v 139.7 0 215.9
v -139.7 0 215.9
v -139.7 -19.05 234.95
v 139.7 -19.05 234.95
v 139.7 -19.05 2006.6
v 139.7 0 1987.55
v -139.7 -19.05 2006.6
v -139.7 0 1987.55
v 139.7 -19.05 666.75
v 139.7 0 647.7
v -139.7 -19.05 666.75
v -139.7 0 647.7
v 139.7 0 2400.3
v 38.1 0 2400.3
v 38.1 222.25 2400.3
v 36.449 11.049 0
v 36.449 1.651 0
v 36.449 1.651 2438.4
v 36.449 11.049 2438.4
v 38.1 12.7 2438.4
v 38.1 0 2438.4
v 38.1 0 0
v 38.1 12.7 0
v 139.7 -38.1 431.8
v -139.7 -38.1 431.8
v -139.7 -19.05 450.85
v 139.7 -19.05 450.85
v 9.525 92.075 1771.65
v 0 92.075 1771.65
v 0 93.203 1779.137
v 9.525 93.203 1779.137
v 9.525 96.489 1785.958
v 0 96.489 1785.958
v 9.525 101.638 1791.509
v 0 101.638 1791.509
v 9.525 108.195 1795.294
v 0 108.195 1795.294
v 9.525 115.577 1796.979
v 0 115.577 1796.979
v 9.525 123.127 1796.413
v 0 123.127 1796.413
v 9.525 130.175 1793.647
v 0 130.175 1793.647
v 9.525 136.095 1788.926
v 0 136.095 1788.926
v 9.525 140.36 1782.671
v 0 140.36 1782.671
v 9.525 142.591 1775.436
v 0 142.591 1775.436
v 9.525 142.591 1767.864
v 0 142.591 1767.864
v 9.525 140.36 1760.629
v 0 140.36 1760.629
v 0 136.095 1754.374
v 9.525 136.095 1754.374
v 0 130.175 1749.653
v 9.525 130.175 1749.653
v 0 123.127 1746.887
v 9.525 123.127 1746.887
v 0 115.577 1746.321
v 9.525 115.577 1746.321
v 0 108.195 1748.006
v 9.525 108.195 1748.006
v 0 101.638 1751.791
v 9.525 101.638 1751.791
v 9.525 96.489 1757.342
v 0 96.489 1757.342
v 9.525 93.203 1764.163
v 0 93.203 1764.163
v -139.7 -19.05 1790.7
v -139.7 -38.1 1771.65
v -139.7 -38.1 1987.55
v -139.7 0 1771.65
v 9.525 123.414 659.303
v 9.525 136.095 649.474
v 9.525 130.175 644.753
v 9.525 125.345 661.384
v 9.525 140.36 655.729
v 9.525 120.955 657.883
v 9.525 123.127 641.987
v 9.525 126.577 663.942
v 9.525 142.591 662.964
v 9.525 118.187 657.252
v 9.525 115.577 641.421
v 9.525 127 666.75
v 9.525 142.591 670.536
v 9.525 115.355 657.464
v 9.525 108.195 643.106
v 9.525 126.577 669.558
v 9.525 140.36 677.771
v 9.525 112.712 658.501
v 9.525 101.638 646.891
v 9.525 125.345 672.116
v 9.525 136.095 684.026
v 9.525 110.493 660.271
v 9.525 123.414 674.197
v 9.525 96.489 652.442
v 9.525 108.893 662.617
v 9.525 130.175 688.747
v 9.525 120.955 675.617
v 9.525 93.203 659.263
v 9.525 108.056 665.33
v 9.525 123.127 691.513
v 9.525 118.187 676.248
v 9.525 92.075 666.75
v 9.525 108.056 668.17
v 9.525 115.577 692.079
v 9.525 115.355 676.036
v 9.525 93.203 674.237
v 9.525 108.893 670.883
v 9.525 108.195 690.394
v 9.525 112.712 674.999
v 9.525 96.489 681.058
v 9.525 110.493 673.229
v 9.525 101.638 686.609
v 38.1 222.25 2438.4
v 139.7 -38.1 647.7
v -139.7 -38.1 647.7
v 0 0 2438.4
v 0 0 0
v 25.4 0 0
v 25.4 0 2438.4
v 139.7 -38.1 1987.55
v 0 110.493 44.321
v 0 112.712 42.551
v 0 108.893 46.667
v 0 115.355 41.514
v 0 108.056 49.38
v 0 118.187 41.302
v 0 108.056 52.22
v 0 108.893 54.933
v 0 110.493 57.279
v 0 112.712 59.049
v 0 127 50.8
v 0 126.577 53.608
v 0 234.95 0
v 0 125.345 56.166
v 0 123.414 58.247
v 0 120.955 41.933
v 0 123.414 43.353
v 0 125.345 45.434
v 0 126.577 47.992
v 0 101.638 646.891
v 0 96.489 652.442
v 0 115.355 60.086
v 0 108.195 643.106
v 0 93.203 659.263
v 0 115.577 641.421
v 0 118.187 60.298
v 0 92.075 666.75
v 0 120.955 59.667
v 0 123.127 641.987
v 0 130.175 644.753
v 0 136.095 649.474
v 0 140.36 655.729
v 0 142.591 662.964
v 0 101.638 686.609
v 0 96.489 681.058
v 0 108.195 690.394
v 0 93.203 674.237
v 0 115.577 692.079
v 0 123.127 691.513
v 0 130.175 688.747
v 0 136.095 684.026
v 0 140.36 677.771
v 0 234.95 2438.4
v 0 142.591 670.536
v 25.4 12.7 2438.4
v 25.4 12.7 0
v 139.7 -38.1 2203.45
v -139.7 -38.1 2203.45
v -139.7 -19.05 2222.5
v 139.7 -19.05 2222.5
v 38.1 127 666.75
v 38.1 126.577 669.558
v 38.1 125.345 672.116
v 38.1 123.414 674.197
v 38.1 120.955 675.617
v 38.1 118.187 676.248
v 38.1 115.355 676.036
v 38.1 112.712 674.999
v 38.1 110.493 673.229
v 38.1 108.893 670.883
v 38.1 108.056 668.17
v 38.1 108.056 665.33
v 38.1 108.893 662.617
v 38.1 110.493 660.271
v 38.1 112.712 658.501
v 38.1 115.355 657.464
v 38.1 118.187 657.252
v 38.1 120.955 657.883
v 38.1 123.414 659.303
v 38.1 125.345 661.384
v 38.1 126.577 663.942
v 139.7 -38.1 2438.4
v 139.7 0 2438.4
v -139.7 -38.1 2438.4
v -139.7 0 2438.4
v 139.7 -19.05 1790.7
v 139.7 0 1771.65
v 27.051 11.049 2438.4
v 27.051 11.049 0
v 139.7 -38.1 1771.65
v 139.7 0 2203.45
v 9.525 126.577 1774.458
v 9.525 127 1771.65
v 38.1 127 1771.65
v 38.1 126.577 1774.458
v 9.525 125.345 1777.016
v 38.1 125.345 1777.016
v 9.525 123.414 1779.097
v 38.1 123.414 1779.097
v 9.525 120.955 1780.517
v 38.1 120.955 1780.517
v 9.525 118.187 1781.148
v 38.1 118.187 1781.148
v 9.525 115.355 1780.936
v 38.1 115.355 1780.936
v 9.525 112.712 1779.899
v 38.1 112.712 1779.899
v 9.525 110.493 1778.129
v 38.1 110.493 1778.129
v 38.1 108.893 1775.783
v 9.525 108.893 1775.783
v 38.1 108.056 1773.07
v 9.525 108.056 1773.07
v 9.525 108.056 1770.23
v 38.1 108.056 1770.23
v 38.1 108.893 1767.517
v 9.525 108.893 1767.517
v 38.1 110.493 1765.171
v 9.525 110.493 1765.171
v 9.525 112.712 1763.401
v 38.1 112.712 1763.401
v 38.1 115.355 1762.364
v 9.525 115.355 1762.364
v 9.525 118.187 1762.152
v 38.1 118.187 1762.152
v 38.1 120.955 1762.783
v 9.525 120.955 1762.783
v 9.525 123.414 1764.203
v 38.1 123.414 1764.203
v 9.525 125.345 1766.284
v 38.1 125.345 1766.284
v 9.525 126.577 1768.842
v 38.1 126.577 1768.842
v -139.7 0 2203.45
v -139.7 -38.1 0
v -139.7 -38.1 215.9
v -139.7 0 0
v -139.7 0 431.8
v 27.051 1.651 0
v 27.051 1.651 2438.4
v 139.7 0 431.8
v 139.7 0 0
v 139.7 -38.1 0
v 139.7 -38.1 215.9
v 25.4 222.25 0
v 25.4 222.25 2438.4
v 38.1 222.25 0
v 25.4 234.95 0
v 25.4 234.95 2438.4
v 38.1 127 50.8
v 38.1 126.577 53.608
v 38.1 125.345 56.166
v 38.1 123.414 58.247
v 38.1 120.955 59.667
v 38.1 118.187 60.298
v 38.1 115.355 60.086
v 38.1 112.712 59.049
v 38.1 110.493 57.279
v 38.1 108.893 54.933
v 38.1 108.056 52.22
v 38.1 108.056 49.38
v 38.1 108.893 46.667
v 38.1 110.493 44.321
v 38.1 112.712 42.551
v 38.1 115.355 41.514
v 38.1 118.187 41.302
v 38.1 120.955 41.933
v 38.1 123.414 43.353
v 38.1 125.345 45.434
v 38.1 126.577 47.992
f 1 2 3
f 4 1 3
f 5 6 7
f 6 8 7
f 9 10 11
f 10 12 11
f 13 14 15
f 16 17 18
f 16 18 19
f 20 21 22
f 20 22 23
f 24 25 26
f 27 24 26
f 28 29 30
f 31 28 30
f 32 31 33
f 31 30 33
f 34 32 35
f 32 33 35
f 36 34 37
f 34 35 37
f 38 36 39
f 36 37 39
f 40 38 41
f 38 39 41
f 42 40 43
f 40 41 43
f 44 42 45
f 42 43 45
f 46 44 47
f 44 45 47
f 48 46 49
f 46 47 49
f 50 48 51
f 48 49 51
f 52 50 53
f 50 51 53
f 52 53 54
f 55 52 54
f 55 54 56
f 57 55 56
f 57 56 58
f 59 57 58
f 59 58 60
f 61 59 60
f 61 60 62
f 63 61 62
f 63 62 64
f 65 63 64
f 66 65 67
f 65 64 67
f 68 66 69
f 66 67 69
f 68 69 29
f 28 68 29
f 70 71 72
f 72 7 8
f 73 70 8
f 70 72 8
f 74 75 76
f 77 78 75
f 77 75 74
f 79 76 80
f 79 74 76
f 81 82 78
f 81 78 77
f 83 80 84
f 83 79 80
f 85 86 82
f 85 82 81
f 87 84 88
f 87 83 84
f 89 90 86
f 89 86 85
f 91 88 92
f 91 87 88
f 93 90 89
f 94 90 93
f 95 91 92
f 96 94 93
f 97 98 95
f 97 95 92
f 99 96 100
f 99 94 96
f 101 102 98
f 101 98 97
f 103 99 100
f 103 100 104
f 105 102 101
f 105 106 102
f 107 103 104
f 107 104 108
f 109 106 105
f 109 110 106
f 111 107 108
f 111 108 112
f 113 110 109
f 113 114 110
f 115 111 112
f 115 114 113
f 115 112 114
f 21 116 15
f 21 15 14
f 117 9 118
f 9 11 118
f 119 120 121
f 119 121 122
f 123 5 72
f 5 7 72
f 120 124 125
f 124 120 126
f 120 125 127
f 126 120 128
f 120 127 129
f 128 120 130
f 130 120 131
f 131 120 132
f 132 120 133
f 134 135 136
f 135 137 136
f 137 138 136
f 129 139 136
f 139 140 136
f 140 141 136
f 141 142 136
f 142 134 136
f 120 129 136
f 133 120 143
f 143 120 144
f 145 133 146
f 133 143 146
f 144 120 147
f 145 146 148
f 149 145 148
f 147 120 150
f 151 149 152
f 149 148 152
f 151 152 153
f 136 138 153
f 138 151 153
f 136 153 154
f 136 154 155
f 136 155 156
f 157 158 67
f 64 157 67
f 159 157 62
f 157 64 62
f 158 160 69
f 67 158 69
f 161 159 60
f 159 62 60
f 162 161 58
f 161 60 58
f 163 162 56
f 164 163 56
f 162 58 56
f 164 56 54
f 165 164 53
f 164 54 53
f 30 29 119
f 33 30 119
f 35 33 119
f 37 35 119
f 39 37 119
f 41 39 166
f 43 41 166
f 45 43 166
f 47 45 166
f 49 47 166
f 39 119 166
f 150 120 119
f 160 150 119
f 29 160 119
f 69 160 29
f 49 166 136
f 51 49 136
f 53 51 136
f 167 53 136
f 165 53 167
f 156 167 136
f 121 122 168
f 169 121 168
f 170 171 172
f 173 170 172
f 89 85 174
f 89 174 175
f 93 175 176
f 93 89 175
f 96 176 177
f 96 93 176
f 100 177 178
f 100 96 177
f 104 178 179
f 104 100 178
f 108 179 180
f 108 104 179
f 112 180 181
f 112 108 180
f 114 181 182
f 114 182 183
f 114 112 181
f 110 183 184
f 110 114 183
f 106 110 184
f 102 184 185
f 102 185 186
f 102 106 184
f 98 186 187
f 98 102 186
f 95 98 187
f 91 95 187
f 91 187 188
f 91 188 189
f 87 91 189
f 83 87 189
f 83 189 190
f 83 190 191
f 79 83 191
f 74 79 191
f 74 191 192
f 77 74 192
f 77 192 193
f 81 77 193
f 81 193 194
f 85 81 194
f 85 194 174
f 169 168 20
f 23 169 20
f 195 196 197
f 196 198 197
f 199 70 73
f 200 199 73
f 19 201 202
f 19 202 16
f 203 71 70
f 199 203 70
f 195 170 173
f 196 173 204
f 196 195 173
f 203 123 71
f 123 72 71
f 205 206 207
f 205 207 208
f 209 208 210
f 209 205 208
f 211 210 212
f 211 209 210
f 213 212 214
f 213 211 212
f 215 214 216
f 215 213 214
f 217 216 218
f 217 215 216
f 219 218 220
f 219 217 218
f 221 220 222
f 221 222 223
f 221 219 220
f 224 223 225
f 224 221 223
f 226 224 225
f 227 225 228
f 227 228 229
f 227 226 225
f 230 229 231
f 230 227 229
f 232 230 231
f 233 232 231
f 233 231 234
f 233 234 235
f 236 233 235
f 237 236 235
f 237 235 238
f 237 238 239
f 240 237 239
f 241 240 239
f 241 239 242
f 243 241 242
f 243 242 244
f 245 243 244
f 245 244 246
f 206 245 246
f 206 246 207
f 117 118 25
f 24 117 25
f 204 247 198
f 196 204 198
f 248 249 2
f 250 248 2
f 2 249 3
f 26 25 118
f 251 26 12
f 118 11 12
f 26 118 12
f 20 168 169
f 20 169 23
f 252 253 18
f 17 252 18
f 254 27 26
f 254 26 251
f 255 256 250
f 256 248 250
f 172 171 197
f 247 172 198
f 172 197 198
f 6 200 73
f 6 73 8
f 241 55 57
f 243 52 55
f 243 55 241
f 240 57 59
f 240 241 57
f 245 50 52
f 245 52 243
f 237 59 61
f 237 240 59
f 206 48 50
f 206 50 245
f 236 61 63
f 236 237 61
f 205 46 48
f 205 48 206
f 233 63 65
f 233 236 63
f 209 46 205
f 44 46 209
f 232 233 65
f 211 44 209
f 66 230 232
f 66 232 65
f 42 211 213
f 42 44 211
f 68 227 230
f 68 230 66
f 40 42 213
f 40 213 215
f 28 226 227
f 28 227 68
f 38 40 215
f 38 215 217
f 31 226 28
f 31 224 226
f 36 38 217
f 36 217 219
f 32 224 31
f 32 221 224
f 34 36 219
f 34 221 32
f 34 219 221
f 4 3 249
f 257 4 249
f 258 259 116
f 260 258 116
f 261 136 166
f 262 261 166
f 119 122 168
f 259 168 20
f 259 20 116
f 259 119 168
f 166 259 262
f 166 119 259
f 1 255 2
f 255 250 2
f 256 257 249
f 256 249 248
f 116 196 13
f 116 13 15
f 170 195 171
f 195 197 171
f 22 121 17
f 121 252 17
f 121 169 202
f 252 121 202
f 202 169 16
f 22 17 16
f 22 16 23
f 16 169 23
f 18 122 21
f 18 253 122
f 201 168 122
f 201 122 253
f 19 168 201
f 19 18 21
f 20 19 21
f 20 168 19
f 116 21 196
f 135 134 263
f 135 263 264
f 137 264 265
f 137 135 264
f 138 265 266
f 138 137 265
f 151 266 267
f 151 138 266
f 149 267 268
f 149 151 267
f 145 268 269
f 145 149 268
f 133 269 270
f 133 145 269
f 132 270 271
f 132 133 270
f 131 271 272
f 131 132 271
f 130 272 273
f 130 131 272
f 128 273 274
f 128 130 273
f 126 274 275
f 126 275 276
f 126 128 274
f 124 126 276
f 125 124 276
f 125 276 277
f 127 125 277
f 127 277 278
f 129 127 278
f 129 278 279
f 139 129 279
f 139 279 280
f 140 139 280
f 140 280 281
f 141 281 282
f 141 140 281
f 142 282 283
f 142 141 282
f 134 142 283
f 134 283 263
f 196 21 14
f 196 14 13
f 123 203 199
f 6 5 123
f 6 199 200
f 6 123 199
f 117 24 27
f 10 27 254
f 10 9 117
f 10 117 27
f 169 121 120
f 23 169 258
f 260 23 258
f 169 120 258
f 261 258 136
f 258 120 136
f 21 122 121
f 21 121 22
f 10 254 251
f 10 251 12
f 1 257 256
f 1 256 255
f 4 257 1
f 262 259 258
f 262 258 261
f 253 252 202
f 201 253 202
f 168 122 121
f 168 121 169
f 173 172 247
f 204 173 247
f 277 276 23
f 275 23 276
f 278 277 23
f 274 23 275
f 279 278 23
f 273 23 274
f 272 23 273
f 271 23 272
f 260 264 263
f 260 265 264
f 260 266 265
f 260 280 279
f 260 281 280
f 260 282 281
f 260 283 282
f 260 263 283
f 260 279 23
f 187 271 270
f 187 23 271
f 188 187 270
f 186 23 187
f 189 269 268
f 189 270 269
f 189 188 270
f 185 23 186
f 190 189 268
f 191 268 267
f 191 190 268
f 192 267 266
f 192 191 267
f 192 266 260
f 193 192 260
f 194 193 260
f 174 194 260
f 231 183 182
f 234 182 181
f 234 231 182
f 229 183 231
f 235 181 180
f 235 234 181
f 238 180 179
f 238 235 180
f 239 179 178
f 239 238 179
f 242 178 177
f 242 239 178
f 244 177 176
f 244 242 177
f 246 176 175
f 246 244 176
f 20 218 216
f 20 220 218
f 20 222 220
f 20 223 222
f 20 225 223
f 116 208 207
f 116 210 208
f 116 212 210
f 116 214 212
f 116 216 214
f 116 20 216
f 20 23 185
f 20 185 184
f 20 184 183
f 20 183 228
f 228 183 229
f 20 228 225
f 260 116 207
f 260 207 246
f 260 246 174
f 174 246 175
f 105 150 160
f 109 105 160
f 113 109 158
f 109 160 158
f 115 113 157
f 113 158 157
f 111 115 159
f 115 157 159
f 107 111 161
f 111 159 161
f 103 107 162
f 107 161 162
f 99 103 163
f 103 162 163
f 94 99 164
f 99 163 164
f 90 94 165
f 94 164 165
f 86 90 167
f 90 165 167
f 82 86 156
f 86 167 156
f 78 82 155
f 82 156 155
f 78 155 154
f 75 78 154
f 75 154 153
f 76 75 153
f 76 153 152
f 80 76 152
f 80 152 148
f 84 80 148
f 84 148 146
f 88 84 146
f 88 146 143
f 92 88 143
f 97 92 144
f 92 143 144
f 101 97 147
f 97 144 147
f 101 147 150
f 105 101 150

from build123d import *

# Parameters (mm, degrees)
F0_W          = 234.95
F0_H          = 2438.4
F0_R          = 9.525
F1_DEPTH      = 38.1
F3_DEPTH      = 177.8
F3_DEPTH_BACK = 101.6
F4_W          = 12.7
F4_H          = 12.7
F5_DEPTH      = 2438.401
F7_DEPTH      = 38.1
F8_W          = 12.7
F8_H          = 12.7
F8_W_2        = 9.398
F8_H_2        = 9.398
F9_DEPTH      = 2438.4
F10_R         = 25.4
F11_DEPTH     = 9.525


with BuildPart() as f1:
    # F0 (on Right) → F1 (new body)
    with BuildSketch(Plane.YZ):
        with Locations((117.475, 1219.2)):
            Rectangle(F0_W, F0_H)
        with Locations((117.475, 50.8)):
            Circle(F0_R, mode=Mode.SUBTRACT)
        with Locations((117.475, 666.75)):
            Circle(F0_R, mode=Mode.SUBTRACT)
        with Locations((117.475, 1771.65)):
            Circle(F0_R, mode=Mode.SUBTRACT)
    extrude(amount=F1_DEPTH)

    # F4 (on face) → F5 (cut, through all)
    with BuildSketch(Plane.XY.offset(2438.4)):
        with Locations((31.75, 228.6)):
            Rectangle(F4_W, F4_H)
        with Locations((31.75, 6.35)):
            Rectangle(F4_W, F4_H)
    extrude(amount=-F5_DEPTH, mode=Mode.SUBTRACT)

    # F10 (on face) → F11 (cut)
    with BuildSketch(Plane(origin=(0, 0, 0), x_dir=(0, -1, 0), z_dir=(-1, 0, 0))):
        with Locations((-117.475, 1771.65)):
            Circle(F10_R)
        with Locations((-117.475, 666.75)):
            Circle(F10_R)
    extrude(amount=-F11_DEPTH, mode=Mode.SUBTRACT)


with BuildPart() as f3:
    # F2 (on face) → F3 (new body, two sides)
    with BuildSketch(Plane.YZ.offset(38.1)) as f3_sk:
        Polygon((-38.1, 215.9), (-38.1, 0), (0, 0), (0, 215.9), (-19.05, 234.95), align=None)
    extrude(amount=-F3_DEPTH)
    extrude(f3_sk.sketch, amount=F3_DEPTH_BACK)


with BuildPart() as f3b:
    # F2 (on face) → F3, piece 2 (new body, two sides)
    with BuildSketch(Plane.YZ.offset(38.1)) as f3_2_sk:
        Polygon((-19.05, 450.85), (0, 431.8), (0, 647.7), (-19.05, 666.75), (-38.1, 647.7), (-38.1, 431.8), align=None)
    extrude(amount=-F3_DEPTH)
    extrude(f3_2_sk.sketch, amount=F3_DEPTH_BACK)


with BuildPart() as f3c:
    # F2 (on face) → F3, piece 3 (new body, two sides)
    with BuildSketch(Plane.YZ.offset(38.1)) as f3_3_sk:
        Polygon((0, 2203.45), (0, 2438.4), (-38.1, 2438.4), (-38.1, 2203.45), (-19.05, 2222.5), align=None)
    extrude(amount=-F3_DEPTH)
    extrude(f3_3_sk.sketch, amount=F3_DEPTH_BACK)


with BuildPart() as f3d:
    # F2 (on face) → F3, piece 4 (new body, two sides)
    with BuildSketch(Plane.YZ.offset(38.1)) as f3_4_sk:
        Polygon((0, 1771.65), (0, 1987.55), (-19.05, 2006.6), (-38.1, 1987.55), (-38.1, 1771.65), (-19.05, 1790.7), align=None)
    extrude(amount=-F3_DEPTH)
    extrude(f3_4_sk.sketch, amount=F3_DEPTH_BACK)


with BuildPart() as f7:
    # F6 (on face) → F7 (new body)
    with BuildSketch(Plane.XY.offset(2438.4)):
        Polygon((139.7, 0), (38.1, 222.25), (38.1, 0), align=None)
    extrude(amount=-F7_DEPTH)


with BuildPart() as f9:
    # F8 (on face) → F9 (new body)
    with BuildSketch(Plane.XY.offset(2438.4)):
        with Locations((31.75, 6.35)):
            Rectangle(F8_W, F8_H)
        with Locations((31.75, 6.35)):
            Rectangle(F8_W_2, F8_H_2, mode=Mode.SUBTRACT)
    extrude(amount=-F9_DEPTH)


solid = Compound([f1.part, f3.part, f3b.part, f3c.part, f3d.part, f7.part, f9.part])
